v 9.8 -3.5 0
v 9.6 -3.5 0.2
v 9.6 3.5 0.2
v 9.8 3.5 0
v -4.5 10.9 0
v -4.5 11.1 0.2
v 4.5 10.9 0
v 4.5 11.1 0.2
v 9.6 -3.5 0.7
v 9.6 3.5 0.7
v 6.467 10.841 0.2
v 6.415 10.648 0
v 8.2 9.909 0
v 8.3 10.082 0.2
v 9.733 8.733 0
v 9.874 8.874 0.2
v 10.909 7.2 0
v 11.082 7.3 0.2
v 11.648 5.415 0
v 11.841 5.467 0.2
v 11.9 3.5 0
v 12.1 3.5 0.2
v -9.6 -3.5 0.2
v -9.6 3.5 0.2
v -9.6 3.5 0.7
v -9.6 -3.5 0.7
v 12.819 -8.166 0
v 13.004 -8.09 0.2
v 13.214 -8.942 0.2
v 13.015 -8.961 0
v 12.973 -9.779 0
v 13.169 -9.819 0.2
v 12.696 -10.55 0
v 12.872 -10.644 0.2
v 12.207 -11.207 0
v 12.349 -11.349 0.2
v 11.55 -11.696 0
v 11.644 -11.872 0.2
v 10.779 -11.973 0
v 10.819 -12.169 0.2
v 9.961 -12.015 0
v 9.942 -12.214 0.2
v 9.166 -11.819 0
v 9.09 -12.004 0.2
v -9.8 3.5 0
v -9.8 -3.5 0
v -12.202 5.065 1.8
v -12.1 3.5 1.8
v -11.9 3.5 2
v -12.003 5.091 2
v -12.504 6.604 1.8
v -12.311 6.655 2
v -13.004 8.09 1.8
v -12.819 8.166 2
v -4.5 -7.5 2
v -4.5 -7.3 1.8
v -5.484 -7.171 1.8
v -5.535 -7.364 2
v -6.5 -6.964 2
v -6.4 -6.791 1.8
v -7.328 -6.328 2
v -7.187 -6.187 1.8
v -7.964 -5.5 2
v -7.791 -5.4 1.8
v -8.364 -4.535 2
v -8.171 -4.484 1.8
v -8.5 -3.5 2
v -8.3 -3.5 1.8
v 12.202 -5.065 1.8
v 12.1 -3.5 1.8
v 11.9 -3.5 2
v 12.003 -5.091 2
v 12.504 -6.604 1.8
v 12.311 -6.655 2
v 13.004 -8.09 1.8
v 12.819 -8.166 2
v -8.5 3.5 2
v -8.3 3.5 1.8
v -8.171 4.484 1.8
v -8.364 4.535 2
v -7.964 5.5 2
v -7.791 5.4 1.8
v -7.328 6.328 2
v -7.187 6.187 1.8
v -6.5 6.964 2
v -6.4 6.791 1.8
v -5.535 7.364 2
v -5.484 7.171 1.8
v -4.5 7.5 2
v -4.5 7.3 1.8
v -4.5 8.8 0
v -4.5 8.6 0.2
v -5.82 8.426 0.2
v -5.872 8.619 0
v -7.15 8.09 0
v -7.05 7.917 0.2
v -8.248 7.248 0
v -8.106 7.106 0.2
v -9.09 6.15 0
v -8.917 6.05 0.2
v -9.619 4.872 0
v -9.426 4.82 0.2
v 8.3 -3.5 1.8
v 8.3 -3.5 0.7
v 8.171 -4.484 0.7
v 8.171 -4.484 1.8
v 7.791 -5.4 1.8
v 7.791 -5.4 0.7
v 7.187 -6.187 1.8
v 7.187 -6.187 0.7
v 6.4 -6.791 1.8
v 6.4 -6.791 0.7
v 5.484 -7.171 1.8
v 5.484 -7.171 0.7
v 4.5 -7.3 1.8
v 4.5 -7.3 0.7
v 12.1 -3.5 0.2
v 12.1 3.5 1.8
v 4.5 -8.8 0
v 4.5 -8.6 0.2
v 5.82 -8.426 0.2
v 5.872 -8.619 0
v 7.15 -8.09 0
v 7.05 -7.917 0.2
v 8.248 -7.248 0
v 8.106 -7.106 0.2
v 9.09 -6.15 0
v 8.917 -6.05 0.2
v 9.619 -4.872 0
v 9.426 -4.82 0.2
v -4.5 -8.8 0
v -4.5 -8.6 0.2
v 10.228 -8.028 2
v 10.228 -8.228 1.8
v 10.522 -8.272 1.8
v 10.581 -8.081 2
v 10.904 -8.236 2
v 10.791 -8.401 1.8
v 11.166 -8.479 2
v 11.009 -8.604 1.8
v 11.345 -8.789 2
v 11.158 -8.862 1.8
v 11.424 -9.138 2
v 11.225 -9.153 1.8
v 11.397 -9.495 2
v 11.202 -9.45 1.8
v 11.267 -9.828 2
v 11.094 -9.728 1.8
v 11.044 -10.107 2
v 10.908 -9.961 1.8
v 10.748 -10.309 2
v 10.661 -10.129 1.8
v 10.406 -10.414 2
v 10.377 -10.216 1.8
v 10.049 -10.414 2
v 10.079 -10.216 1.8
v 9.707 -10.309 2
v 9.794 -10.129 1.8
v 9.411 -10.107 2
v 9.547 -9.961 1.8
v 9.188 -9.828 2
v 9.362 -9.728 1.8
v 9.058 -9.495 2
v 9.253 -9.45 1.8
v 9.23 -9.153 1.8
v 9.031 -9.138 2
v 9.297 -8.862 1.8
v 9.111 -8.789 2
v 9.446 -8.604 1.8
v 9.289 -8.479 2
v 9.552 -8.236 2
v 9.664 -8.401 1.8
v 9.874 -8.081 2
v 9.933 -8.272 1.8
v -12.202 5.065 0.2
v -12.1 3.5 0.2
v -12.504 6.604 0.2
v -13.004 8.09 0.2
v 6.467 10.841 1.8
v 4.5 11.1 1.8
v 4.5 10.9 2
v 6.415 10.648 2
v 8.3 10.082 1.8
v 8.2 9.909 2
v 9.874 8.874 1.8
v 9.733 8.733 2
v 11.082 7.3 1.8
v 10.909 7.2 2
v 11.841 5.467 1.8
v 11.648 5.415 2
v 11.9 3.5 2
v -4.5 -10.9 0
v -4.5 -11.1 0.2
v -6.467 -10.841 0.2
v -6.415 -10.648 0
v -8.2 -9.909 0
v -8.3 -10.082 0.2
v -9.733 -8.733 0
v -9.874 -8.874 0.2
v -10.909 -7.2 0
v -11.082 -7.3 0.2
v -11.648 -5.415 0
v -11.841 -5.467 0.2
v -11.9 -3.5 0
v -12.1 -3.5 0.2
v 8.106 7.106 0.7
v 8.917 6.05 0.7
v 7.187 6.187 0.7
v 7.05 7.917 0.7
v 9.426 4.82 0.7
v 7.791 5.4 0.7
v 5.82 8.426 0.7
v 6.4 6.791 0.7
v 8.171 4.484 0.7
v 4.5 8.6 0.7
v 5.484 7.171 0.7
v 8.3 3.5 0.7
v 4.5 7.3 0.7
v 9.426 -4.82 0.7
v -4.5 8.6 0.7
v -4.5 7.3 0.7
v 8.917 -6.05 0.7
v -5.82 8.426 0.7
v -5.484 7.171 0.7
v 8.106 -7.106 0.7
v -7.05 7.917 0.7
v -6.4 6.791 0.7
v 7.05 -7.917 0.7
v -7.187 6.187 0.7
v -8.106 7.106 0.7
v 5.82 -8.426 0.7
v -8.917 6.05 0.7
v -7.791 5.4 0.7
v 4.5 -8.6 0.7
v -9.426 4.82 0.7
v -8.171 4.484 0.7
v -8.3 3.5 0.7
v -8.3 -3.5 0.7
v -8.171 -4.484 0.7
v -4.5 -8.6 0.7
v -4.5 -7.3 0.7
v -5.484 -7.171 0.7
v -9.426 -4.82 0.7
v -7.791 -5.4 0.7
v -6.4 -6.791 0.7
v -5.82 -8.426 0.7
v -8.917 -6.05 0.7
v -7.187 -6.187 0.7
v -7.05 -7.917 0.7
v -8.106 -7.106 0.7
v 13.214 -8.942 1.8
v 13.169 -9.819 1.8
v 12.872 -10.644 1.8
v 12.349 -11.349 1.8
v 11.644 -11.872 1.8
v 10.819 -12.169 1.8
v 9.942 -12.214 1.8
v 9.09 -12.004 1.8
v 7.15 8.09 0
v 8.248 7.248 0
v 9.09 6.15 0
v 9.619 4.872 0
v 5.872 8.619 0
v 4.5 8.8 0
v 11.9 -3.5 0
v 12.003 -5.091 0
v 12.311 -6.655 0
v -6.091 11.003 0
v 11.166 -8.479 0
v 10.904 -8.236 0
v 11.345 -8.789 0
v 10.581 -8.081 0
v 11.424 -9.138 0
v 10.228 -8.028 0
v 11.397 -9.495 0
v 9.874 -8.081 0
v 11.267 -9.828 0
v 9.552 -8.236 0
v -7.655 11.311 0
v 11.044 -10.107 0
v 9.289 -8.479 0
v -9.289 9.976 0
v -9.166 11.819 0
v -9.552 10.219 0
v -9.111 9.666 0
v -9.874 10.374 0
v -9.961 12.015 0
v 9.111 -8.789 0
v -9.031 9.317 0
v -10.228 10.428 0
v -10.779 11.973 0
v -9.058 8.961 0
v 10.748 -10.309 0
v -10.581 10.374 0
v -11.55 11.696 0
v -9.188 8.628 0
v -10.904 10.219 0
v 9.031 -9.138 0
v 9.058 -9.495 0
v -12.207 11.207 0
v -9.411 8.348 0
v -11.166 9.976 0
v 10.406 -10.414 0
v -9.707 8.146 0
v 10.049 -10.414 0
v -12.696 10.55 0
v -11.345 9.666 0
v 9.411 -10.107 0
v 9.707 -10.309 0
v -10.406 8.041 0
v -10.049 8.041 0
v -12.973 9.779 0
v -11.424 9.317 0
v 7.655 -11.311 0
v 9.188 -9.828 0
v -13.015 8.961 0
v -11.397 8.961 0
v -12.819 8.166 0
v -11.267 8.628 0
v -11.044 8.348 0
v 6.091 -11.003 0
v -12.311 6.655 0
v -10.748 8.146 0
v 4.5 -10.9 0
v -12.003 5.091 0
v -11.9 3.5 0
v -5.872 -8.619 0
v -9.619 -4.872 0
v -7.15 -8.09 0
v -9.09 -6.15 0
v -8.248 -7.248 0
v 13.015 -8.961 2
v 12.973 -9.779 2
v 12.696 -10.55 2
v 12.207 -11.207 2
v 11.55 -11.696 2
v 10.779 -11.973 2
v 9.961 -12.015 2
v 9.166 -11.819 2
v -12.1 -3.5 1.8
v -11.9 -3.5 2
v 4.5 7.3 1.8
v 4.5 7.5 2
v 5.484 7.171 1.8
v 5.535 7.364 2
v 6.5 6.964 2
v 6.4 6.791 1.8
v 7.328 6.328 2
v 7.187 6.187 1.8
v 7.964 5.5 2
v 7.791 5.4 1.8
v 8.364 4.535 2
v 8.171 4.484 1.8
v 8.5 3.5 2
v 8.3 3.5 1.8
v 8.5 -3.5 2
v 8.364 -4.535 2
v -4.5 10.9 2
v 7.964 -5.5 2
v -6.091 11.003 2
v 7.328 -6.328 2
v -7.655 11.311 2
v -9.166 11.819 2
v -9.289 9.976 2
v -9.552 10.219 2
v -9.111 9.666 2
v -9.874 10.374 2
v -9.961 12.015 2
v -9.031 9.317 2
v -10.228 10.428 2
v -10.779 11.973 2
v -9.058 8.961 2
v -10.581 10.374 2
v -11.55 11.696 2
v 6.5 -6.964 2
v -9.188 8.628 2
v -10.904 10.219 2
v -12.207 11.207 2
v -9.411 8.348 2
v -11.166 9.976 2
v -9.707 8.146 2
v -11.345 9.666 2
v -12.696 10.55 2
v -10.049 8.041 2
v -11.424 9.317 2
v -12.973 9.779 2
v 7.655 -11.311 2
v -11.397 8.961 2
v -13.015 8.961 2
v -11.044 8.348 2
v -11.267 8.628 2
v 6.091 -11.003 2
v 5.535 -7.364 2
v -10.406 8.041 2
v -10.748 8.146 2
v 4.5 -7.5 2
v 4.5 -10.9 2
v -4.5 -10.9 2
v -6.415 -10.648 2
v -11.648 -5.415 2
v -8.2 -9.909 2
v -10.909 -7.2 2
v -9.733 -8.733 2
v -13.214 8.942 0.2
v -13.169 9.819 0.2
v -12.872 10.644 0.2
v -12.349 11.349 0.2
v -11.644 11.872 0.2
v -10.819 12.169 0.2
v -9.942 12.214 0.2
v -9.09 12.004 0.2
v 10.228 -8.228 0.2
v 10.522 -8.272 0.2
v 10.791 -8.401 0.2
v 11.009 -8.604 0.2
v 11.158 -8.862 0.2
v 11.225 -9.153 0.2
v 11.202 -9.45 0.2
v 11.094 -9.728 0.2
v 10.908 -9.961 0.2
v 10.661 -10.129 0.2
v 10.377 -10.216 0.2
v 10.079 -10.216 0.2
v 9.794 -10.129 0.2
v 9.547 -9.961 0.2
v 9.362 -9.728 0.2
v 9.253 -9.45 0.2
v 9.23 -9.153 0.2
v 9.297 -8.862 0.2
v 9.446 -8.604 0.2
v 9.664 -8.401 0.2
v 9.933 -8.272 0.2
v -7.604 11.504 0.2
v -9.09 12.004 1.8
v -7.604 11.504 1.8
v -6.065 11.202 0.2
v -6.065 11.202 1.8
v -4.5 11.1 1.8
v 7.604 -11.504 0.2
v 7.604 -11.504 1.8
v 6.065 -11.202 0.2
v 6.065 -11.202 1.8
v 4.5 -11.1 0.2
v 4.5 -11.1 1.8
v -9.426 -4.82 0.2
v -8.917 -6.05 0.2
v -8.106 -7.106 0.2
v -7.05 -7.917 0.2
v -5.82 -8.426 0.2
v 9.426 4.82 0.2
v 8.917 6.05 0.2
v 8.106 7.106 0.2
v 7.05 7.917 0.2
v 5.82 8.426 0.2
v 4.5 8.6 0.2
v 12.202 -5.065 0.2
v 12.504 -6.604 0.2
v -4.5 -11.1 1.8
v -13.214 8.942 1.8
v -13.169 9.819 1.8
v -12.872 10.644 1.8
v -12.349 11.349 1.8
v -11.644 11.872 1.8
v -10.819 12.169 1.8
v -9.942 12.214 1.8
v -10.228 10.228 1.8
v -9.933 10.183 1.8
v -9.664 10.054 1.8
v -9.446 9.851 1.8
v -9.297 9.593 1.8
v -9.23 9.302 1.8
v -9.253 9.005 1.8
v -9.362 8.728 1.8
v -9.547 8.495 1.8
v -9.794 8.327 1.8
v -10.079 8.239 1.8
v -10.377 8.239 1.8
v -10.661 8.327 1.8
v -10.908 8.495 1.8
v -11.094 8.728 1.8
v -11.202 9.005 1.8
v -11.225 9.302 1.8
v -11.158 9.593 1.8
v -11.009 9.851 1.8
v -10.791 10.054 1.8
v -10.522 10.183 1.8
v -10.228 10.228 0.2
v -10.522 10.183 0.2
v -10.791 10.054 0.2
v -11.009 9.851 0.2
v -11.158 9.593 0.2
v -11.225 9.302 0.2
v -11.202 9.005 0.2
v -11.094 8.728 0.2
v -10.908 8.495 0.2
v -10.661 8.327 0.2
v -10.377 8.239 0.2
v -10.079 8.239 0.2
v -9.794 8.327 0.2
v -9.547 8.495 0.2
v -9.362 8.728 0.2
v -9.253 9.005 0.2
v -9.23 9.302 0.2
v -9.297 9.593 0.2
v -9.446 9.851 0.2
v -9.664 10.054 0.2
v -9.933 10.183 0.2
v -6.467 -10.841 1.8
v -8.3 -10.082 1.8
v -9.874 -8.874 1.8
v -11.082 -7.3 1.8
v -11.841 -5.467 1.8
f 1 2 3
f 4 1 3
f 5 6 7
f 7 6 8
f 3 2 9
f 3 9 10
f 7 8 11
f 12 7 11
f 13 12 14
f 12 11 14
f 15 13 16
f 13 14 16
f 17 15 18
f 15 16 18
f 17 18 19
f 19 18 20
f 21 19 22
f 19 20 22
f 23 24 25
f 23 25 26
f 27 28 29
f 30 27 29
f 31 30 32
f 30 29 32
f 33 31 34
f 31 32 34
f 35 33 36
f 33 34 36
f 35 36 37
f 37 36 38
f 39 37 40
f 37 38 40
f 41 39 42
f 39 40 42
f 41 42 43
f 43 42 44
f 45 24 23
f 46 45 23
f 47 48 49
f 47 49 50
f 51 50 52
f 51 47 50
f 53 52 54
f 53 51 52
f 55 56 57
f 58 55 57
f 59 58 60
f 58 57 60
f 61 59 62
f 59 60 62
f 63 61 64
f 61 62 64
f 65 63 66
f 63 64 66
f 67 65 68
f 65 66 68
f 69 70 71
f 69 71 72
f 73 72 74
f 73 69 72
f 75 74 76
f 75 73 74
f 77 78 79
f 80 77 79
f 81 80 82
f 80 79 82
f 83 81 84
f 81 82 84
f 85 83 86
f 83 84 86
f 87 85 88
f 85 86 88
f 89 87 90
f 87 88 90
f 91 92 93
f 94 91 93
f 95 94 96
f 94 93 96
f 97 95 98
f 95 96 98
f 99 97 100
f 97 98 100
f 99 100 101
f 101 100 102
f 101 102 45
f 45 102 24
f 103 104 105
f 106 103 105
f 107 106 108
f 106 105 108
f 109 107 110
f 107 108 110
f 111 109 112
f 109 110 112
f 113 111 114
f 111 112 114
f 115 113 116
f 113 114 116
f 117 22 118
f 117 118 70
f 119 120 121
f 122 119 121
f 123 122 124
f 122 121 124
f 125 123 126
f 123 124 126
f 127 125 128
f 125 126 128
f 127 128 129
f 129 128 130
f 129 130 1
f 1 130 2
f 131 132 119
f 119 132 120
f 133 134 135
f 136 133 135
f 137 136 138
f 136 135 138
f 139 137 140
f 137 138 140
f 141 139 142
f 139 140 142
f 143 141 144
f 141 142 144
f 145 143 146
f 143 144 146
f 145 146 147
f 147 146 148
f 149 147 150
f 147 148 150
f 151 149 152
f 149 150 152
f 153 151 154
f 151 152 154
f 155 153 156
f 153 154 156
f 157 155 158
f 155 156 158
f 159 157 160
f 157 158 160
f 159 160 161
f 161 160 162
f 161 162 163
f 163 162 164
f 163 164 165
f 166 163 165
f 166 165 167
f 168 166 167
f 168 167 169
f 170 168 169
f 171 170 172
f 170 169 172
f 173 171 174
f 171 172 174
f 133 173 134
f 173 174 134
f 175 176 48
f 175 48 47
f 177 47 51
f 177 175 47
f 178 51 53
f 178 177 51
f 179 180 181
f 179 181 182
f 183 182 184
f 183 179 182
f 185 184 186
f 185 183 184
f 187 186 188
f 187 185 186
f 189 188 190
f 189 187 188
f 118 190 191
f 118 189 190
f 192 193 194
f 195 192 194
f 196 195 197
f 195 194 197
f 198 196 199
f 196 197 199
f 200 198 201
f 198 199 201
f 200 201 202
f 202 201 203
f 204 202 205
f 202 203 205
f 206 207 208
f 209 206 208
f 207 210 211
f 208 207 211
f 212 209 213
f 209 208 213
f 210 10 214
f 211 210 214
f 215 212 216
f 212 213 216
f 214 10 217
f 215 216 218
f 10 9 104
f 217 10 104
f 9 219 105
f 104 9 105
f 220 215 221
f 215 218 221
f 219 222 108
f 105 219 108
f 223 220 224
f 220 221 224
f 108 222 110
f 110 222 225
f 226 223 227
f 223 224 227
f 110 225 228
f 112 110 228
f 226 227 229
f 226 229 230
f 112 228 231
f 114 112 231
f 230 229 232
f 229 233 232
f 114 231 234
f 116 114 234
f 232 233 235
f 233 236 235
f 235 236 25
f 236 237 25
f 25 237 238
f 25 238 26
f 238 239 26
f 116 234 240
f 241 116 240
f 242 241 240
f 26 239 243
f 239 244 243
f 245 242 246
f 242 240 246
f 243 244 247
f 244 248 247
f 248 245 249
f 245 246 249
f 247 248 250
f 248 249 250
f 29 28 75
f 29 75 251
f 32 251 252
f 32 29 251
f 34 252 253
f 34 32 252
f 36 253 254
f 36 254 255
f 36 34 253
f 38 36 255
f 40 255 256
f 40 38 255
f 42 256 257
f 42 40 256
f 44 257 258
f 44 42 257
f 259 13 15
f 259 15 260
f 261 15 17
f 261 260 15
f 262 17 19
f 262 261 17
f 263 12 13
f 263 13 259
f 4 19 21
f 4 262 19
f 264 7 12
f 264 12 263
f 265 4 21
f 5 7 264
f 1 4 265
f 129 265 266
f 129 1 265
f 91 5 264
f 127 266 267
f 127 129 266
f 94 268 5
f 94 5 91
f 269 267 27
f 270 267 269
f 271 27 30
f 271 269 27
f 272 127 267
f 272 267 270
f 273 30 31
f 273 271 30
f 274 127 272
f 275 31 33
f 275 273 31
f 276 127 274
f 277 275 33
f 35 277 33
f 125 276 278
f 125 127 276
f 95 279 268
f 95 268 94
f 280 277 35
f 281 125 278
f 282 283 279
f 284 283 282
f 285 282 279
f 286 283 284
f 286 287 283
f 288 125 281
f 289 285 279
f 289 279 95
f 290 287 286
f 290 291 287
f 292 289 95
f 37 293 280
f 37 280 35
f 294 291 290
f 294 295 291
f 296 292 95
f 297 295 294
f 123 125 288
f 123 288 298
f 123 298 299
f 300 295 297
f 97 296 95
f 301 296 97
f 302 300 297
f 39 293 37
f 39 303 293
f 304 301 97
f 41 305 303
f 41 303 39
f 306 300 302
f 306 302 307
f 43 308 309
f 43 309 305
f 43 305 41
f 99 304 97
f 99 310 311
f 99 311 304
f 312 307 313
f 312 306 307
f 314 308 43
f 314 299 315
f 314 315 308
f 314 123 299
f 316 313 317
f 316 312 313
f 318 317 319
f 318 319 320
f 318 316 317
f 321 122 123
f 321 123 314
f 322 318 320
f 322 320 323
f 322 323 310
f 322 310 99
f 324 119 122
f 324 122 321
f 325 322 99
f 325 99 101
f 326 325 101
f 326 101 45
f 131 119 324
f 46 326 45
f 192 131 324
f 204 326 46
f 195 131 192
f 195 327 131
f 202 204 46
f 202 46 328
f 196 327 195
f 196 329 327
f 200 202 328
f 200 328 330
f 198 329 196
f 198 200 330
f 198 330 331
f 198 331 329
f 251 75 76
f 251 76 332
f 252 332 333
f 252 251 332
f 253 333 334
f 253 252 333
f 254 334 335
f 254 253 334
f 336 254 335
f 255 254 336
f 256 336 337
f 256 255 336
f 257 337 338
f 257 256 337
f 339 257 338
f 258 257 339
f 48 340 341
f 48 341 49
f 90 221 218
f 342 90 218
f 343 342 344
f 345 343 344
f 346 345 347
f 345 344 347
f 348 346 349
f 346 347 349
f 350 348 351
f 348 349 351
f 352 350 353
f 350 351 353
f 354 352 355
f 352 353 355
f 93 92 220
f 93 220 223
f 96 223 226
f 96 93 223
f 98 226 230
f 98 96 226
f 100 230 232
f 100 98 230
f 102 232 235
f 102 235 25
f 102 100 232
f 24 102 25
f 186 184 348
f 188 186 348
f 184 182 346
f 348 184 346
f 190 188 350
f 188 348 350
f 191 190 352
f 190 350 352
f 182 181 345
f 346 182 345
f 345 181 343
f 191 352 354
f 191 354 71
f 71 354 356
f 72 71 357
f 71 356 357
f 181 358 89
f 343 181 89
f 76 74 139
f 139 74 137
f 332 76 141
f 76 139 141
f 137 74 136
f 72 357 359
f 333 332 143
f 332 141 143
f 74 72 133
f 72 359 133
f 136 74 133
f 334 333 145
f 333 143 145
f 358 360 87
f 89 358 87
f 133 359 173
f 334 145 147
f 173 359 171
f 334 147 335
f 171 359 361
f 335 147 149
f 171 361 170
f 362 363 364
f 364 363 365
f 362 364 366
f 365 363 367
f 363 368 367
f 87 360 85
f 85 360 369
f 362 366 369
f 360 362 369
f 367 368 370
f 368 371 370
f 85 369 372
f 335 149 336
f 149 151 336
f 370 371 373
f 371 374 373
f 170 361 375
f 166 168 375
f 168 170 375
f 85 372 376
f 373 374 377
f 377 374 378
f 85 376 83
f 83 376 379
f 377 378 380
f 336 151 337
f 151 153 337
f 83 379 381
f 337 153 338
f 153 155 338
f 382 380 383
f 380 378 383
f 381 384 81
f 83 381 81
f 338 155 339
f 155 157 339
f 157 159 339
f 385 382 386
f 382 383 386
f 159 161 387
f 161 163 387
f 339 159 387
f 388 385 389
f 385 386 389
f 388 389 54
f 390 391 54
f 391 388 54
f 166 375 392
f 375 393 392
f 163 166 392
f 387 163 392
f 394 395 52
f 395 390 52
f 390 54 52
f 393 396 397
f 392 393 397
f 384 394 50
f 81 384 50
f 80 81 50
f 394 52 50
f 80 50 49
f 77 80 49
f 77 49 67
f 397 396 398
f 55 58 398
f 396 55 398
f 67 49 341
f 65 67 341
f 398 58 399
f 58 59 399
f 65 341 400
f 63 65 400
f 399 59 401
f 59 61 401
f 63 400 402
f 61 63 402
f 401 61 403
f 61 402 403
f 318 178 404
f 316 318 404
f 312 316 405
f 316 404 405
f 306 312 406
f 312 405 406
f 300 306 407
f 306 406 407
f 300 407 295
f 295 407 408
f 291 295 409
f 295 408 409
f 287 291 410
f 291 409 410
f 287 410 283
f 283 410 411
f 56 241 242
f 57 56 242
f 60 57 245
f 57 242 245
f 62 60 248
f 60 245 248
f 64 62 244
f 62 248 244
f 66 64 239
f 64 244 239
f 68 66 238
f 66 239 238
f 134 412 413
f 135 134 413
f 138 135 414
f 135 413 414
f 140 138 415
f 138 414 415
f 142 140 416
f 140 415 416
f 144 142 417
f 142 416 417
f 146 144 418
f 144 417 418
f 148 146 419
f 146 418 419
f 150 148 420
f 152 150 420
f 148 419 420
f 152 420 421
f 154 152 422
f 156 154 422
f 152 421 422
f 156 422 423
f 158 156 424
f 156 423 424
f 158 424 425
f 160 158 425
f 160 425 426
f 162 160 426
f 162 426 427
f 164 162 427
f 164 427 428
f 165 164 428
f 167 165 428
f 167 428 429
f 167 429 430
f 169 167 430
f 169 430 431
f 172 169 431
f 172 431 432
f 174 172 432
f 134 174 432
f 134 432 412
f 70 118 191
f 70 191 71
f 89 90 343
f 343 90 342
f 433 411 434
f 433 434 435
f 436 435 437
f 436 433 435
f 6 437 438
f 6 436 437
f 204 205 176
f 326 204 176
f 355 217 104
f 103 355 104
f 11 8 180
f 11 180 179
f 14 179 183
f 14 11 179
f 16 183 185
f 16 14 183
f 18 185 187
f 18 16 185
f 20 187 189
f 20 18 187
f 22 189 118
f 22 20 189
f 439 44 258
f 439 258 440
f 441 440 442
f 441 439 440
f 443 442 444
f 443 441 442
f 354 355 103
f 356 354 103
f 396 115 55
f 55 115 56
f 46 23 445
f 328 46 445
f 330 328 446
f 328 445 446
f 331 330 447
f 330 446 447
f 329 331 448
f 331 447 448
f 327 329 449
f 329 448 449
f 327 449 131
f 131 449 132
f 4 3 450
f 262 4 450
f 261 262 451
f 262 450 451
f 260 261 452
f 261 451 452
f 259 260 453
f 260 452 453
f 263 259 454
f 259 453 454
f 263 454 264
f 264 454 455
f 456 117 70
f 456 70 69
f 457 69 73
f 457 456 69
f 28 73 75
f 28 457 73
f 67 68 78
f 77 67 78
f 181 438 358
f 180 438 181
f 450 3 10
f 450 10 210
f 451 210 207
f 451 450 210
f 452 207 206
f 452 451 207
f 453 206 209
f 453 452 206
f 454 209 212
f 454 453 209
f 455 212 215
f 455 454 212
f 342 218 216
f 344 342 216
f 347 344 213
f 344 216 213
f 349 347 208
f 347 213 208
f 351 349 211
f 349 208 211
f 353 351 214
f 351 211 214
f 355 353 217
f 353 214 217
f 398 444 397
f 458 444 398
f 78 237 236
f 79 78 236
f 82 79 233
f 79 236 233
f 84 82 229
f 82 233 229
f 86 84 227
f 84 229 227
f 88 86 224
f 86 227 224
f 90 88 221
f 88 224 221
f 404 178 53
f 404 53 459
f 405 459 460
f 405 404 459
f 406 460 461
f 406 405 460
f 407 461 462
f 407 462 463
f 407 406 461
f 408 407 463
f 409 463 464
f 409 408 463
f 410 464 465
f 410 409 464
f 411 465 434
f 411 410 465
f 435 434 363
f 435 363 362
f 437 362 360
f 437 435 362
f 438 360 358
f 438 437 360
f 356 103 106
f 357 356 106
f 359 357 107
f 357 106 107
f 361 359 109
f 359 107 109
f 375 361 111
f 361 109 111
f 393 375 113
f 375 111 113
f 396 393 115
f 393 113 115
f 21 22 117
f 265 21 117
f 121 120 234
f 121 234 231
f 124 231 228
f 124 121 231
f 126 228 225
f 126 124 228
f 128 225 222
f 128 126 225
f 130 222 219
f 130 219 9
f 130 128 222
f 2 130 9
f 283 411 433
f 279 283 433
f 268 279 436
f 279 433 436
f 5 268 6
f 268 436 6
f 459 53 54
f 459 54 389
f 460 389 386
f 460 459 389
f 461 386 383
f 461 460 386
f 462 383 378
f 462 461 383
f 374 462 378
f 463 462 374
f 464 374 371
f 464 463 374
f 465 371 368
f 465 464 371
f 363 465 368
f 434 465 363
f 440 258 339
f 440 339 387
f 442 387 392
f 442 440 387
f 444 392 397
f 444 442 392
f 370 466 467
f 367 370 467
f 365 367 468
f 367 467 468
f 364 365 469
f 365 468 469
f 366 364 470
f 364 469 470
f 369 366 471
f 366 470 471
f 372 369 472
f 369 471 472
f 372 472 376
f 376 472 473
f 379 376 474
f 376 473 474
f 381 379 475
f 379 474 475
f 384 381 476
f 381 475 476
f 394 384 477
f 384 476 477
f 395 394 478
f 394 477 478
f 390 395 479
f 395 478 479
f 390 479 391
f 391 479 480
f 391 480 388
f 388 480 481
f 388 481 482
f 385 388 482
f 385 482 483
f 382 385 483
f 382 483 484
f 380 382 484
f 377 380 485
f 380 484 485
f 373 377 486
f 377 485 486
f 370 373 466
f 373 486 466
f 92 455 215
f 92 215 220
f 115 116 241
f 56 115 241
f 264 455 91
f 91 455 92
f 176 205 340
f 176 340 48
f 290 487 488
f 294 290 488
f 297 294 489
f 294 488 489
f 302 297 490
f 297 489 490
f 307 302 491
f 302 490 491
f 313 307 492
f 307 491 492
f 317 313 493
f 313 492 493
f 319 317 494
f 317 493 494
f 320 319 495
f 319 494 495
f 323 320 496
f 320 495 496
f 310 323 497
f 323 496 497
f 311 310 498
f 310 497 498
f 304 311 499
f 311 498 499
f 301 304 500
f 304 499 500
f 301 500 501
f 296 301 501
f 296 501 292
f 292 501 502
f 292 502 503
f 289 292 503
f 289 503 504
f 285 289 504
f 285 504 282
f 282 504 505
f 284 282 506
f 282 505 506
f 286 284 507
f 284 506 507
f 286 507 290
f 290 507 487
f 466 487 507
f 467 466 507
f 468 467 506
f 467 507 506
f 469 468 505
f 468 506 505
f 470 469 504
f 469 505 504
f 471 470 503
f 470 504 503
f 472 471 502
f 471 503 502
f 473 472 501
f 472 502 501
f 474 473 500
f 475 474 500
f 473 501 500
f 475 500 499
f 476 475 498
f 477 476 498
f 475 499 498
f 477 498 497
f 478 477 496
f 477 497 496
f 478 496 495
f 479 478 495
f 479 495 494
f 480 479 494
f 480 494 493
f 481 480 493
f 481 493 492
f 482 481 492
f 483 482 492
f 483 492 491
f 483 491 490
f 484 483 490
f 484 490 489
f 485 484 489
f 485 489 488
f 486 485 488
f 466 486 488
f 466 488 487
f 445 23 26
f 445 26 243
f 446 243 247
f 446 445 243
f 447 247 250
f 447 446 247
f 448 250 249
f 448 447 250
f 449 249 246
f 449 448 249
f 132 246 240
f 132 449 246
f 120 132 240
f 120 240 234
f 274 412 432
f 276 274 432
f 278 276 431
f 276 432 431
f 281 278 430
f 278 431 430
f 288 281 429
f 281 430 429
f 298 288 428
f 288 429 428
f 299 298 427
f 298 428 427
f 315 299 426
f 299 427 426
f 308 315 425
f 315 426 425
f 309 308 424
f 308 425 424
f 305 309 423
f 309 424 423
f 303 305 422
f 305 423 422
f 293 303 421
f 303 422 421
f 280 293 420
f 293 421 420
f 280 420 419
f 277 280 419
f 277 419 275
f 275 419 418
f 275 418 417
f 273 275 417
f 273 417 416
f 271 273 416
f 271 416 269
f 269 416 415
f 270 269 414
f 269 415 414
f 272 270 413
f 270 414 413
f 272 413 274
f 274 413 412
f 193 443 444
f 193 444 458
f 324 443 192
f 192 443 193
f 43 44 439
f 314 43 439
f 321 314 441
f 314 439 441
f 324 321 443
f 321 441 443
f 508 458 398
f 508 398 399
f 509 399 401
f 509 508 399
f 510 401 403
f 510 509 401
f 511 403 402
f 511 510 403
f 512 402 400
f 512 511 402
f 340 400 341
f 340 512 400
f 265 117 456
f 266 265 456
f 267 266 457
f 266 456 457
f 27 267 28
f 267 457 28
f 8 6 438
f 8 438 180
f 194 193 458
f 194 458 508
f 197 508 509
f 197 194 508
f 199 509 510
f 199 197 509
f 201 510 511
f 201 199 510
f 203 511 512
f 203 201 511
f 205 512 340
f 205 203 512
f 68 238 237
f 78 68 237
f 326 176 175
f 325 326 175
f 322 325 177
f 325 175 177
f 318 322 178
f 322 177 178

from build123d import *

# Parameters (mm, degrees)
AUFSATZ_LINEAR_AUSTRAGEN1_DEPTH    = 2
F_2_0_2_DURCHMESSER_BOHRUNG1_D     = 2
F_2_0_2_DURCHMESSER_BOHRUNG1_DEPTH = 2
F_2_0_2_DURCHMESSER_BOHRUNG1_TIP   = 0.600860619
SCHNITT_LINEAR_AUSTRAGEN1_DEPTH    = 0.7
FASE2_SIZE                         = 0.2


with BuildPart() as part:
    # Skizze1 → Aufsatz-Linear austragen1 (new body)
    with BuildSketch(Plane(origin=(0, 0, 0), x_dir=(0, 1, 0), z_dir=(0, 0, 1))):
        with BuildLine():
            Line((-3.5, 12.1), (3.5, 12.1))
            ThreePointArc((3.5, 12.1), (5.839273194, 12.328073296), (8.090437621, 13.0037028))
            ThreePointArc((8.090437621, 13.0037028), (11.348885271, 12.348885271), (12.0037028, 9.090437621))
            ThreePointArc((12.0037028, 9.090437621), (11.328073296, 6.839273194), (11.1, 4.5))
            Line((11.1, 4.5), (11.1, -4.5))
            ThreePointArc((11.1, -4.5), (8.874011537, -9.874011537), (3.5, -12.1))
            Line((3.5, -12.1), (-3.5, -12.1))
            ThreePointArc((-3.5, -12.1), (-5.839273194, -12.328073296), (-8.090437621, -13.0037028))
            ThreePointArc((-8.090437621, -13.0037028), (-11.348885271, -12.348885271), (-12.0037028, -9.090437621))
            ThreePointArc((-12.0037028, -9.090437621), (-11.328073296, -6.839273194), (-11.1, -4.5))
            Line((-11.1, -4.5), (-11.1, 4.5))
            ThreePointArc((-11.1, 4.5), (-8.874011537, 9.874011537), (-3.5, 12.1))
        make_face()
        with BuildLine():
            Line((-3.5, 8.3), (3.5, 8.3))
            ThreePointArc((3.5, 8.3), (6.187005769, 7.187005769), (7.3, 4.5))
            Line((7.3, 4.5), (7.3, -4.5))
            ThreePointArc((7.3, -4.5), (6.187005769, -7.187005769), (3.5, -8.3))
            Line((3.5, -8.3), (-3.5, -8.3))
            ThreePointArc((-3.5, -8.3), (-6.187005769, -7.187005769), (-7.3, -4.5))
            Line((-7.3, -4.5), (-7.3, 4.5))
            ThreePointArc((-7.3, 4.5), (-6.187005769, 7.187005769), (-3.5, 8.3))
        make_face(mode=Mode.SUBTRACT)
    extrude(amount=AUFSATZ_LINEAR_AUSTRAGEN1_DEPTH)

    # Ø2.0 (2) Durchmesser Bohrung1
    with Locations(Plane(origin=(0, 0, 2), x_dir=(0, -1, 0), z_dir=(0, 0, 1))):
        with Locations((-9.227564928, -10.227564928), (9.227564928, 10.227564928)):
            Hole(F_2_0_2_DURCHMESSER_BOHRUNG1_D / 2, depth=F_2_0_2_DURCHMESSER_BOHRUNG1_DEPTH)
            with Locations((0, 0, -(F_2_0_2_DURCHMESSER_BOHRUNG1_DEPTH + F_2_0_2_DURCHMESSER_BOHRUNG1_TIP / 2))):  # 118° drill point
                Cone(0, F_2_0_2_DURCHMESSER_BOHRUNG1_D / 2, F_2_0_2_DURCHMESSER_BOHRUNG1_TIP, mode=Mode.SUBTRACT)

    # Skizze5 → Schnitt-Linear austragen1 (cut)
    with BuildSketch(Plane(origin=(0, 0, 0), x_dir=(1, 0, 0), z_dir=(0, 0, -1))):
        with BuildLine():
            Line((4.5, -8.6), (-4.5, -8.6))
            ThreePointArc((-4.5, -8.6), (-8.106244584, -7.106244584), (-9.6, -3.5))
            Line((-9.6, -3.5), (-9.6, 3.5))
            ThreePointArc((-9.6, 3.5), (-8.106244584, 7.106244584), (-4.5, 8.6))
            Line((-4.5, 8.6), (4.5, 8.6))
            ThreePointArc((4.5, 8.6), (8.106244584, 7.106244584), (9.6, 3.5))
            Line((9.6, 3.5), (9.6, -3.5))
            ThreePointArc((9.6, -3.5), (8.106244584, -7.106244584), (4.5, -8.6))
        make_face()
    extrude(amount=-SCHNITT_LINEAR_AUSTRAGEN1_DEPTH, mode=Mode.SUBTRACT)

    # Fase2
    fase2_edges = [part.edges().sort_by_distance(p)[0] for p in [
        (0, 11.1, 2),
        (-8.3, 0, 2),
        (-7.187005769, 6.187005769, 2),
        (0, 7.3, 2),
        (0, 11.1, 0),
        (9.874011537, 8.874011537, 0),
        (12.1, 0, 0),
        (12.328073296, -5.839273194, 0),
        (12.348885271, -11.348885271, 0),
        (6.839273194, -11.328073296, 0),
        (0, -11.1, 0),
        (-9.874011537, -8.874011537, 0),
        (-12.1, 0, 0),
        (-12.328073296, 5.839273194, 0),
        (7.187005769, 6.187005769, 2),
        (-12.348885271, 11.348885271, 0),
        (-6.839273194, 11.328073296, 0),
        (8.3, 0, 2),
        (7.187005769, -6.187005769, 2),
        (0, -7.3, 2),
        (-6.839273194, 11.328073296, 2),
        (-12.348885271, 11.348885271, 2),
        (-12.328073296, 5.839273194, 2),
        (-12.1, 0, 2),
        (10.227564928, -10.227564928, 2),
        (10.227564928, -10.227564928, 0),
        (-9.874011537, -8.874011537, 2),
        (-7.187005769, -6.187005769, 2),
        (-10.227564928, 8.227564928, 2),
        (-10.227564928, 8.227564928, 0),
        (0, -11.1, 2),
        (6.839273194, -11.328073296, 2),
        (12.348885271, -11.348885271, 2),
        (12.328073296, -5.839273194, 2),
        (-8.106244584, 7.106244584, 0),
        (0, 8.6, 0),
        (8.106244584, 7.106244584, 0),
        (9.6, 0, 0),
        (8.106244584, -7.106244584, 0),
        (0, -8.6, 0),
        (-8.106244584, -7.106244584, 0),
        (12.1, 0, 2),
        (-9.6, 0, 0),
        (9.874011537, 8.874011537, 2),
    ]]
    chamfer(fase2_edges, length=FASE2_SIZE)


solid = part.part
